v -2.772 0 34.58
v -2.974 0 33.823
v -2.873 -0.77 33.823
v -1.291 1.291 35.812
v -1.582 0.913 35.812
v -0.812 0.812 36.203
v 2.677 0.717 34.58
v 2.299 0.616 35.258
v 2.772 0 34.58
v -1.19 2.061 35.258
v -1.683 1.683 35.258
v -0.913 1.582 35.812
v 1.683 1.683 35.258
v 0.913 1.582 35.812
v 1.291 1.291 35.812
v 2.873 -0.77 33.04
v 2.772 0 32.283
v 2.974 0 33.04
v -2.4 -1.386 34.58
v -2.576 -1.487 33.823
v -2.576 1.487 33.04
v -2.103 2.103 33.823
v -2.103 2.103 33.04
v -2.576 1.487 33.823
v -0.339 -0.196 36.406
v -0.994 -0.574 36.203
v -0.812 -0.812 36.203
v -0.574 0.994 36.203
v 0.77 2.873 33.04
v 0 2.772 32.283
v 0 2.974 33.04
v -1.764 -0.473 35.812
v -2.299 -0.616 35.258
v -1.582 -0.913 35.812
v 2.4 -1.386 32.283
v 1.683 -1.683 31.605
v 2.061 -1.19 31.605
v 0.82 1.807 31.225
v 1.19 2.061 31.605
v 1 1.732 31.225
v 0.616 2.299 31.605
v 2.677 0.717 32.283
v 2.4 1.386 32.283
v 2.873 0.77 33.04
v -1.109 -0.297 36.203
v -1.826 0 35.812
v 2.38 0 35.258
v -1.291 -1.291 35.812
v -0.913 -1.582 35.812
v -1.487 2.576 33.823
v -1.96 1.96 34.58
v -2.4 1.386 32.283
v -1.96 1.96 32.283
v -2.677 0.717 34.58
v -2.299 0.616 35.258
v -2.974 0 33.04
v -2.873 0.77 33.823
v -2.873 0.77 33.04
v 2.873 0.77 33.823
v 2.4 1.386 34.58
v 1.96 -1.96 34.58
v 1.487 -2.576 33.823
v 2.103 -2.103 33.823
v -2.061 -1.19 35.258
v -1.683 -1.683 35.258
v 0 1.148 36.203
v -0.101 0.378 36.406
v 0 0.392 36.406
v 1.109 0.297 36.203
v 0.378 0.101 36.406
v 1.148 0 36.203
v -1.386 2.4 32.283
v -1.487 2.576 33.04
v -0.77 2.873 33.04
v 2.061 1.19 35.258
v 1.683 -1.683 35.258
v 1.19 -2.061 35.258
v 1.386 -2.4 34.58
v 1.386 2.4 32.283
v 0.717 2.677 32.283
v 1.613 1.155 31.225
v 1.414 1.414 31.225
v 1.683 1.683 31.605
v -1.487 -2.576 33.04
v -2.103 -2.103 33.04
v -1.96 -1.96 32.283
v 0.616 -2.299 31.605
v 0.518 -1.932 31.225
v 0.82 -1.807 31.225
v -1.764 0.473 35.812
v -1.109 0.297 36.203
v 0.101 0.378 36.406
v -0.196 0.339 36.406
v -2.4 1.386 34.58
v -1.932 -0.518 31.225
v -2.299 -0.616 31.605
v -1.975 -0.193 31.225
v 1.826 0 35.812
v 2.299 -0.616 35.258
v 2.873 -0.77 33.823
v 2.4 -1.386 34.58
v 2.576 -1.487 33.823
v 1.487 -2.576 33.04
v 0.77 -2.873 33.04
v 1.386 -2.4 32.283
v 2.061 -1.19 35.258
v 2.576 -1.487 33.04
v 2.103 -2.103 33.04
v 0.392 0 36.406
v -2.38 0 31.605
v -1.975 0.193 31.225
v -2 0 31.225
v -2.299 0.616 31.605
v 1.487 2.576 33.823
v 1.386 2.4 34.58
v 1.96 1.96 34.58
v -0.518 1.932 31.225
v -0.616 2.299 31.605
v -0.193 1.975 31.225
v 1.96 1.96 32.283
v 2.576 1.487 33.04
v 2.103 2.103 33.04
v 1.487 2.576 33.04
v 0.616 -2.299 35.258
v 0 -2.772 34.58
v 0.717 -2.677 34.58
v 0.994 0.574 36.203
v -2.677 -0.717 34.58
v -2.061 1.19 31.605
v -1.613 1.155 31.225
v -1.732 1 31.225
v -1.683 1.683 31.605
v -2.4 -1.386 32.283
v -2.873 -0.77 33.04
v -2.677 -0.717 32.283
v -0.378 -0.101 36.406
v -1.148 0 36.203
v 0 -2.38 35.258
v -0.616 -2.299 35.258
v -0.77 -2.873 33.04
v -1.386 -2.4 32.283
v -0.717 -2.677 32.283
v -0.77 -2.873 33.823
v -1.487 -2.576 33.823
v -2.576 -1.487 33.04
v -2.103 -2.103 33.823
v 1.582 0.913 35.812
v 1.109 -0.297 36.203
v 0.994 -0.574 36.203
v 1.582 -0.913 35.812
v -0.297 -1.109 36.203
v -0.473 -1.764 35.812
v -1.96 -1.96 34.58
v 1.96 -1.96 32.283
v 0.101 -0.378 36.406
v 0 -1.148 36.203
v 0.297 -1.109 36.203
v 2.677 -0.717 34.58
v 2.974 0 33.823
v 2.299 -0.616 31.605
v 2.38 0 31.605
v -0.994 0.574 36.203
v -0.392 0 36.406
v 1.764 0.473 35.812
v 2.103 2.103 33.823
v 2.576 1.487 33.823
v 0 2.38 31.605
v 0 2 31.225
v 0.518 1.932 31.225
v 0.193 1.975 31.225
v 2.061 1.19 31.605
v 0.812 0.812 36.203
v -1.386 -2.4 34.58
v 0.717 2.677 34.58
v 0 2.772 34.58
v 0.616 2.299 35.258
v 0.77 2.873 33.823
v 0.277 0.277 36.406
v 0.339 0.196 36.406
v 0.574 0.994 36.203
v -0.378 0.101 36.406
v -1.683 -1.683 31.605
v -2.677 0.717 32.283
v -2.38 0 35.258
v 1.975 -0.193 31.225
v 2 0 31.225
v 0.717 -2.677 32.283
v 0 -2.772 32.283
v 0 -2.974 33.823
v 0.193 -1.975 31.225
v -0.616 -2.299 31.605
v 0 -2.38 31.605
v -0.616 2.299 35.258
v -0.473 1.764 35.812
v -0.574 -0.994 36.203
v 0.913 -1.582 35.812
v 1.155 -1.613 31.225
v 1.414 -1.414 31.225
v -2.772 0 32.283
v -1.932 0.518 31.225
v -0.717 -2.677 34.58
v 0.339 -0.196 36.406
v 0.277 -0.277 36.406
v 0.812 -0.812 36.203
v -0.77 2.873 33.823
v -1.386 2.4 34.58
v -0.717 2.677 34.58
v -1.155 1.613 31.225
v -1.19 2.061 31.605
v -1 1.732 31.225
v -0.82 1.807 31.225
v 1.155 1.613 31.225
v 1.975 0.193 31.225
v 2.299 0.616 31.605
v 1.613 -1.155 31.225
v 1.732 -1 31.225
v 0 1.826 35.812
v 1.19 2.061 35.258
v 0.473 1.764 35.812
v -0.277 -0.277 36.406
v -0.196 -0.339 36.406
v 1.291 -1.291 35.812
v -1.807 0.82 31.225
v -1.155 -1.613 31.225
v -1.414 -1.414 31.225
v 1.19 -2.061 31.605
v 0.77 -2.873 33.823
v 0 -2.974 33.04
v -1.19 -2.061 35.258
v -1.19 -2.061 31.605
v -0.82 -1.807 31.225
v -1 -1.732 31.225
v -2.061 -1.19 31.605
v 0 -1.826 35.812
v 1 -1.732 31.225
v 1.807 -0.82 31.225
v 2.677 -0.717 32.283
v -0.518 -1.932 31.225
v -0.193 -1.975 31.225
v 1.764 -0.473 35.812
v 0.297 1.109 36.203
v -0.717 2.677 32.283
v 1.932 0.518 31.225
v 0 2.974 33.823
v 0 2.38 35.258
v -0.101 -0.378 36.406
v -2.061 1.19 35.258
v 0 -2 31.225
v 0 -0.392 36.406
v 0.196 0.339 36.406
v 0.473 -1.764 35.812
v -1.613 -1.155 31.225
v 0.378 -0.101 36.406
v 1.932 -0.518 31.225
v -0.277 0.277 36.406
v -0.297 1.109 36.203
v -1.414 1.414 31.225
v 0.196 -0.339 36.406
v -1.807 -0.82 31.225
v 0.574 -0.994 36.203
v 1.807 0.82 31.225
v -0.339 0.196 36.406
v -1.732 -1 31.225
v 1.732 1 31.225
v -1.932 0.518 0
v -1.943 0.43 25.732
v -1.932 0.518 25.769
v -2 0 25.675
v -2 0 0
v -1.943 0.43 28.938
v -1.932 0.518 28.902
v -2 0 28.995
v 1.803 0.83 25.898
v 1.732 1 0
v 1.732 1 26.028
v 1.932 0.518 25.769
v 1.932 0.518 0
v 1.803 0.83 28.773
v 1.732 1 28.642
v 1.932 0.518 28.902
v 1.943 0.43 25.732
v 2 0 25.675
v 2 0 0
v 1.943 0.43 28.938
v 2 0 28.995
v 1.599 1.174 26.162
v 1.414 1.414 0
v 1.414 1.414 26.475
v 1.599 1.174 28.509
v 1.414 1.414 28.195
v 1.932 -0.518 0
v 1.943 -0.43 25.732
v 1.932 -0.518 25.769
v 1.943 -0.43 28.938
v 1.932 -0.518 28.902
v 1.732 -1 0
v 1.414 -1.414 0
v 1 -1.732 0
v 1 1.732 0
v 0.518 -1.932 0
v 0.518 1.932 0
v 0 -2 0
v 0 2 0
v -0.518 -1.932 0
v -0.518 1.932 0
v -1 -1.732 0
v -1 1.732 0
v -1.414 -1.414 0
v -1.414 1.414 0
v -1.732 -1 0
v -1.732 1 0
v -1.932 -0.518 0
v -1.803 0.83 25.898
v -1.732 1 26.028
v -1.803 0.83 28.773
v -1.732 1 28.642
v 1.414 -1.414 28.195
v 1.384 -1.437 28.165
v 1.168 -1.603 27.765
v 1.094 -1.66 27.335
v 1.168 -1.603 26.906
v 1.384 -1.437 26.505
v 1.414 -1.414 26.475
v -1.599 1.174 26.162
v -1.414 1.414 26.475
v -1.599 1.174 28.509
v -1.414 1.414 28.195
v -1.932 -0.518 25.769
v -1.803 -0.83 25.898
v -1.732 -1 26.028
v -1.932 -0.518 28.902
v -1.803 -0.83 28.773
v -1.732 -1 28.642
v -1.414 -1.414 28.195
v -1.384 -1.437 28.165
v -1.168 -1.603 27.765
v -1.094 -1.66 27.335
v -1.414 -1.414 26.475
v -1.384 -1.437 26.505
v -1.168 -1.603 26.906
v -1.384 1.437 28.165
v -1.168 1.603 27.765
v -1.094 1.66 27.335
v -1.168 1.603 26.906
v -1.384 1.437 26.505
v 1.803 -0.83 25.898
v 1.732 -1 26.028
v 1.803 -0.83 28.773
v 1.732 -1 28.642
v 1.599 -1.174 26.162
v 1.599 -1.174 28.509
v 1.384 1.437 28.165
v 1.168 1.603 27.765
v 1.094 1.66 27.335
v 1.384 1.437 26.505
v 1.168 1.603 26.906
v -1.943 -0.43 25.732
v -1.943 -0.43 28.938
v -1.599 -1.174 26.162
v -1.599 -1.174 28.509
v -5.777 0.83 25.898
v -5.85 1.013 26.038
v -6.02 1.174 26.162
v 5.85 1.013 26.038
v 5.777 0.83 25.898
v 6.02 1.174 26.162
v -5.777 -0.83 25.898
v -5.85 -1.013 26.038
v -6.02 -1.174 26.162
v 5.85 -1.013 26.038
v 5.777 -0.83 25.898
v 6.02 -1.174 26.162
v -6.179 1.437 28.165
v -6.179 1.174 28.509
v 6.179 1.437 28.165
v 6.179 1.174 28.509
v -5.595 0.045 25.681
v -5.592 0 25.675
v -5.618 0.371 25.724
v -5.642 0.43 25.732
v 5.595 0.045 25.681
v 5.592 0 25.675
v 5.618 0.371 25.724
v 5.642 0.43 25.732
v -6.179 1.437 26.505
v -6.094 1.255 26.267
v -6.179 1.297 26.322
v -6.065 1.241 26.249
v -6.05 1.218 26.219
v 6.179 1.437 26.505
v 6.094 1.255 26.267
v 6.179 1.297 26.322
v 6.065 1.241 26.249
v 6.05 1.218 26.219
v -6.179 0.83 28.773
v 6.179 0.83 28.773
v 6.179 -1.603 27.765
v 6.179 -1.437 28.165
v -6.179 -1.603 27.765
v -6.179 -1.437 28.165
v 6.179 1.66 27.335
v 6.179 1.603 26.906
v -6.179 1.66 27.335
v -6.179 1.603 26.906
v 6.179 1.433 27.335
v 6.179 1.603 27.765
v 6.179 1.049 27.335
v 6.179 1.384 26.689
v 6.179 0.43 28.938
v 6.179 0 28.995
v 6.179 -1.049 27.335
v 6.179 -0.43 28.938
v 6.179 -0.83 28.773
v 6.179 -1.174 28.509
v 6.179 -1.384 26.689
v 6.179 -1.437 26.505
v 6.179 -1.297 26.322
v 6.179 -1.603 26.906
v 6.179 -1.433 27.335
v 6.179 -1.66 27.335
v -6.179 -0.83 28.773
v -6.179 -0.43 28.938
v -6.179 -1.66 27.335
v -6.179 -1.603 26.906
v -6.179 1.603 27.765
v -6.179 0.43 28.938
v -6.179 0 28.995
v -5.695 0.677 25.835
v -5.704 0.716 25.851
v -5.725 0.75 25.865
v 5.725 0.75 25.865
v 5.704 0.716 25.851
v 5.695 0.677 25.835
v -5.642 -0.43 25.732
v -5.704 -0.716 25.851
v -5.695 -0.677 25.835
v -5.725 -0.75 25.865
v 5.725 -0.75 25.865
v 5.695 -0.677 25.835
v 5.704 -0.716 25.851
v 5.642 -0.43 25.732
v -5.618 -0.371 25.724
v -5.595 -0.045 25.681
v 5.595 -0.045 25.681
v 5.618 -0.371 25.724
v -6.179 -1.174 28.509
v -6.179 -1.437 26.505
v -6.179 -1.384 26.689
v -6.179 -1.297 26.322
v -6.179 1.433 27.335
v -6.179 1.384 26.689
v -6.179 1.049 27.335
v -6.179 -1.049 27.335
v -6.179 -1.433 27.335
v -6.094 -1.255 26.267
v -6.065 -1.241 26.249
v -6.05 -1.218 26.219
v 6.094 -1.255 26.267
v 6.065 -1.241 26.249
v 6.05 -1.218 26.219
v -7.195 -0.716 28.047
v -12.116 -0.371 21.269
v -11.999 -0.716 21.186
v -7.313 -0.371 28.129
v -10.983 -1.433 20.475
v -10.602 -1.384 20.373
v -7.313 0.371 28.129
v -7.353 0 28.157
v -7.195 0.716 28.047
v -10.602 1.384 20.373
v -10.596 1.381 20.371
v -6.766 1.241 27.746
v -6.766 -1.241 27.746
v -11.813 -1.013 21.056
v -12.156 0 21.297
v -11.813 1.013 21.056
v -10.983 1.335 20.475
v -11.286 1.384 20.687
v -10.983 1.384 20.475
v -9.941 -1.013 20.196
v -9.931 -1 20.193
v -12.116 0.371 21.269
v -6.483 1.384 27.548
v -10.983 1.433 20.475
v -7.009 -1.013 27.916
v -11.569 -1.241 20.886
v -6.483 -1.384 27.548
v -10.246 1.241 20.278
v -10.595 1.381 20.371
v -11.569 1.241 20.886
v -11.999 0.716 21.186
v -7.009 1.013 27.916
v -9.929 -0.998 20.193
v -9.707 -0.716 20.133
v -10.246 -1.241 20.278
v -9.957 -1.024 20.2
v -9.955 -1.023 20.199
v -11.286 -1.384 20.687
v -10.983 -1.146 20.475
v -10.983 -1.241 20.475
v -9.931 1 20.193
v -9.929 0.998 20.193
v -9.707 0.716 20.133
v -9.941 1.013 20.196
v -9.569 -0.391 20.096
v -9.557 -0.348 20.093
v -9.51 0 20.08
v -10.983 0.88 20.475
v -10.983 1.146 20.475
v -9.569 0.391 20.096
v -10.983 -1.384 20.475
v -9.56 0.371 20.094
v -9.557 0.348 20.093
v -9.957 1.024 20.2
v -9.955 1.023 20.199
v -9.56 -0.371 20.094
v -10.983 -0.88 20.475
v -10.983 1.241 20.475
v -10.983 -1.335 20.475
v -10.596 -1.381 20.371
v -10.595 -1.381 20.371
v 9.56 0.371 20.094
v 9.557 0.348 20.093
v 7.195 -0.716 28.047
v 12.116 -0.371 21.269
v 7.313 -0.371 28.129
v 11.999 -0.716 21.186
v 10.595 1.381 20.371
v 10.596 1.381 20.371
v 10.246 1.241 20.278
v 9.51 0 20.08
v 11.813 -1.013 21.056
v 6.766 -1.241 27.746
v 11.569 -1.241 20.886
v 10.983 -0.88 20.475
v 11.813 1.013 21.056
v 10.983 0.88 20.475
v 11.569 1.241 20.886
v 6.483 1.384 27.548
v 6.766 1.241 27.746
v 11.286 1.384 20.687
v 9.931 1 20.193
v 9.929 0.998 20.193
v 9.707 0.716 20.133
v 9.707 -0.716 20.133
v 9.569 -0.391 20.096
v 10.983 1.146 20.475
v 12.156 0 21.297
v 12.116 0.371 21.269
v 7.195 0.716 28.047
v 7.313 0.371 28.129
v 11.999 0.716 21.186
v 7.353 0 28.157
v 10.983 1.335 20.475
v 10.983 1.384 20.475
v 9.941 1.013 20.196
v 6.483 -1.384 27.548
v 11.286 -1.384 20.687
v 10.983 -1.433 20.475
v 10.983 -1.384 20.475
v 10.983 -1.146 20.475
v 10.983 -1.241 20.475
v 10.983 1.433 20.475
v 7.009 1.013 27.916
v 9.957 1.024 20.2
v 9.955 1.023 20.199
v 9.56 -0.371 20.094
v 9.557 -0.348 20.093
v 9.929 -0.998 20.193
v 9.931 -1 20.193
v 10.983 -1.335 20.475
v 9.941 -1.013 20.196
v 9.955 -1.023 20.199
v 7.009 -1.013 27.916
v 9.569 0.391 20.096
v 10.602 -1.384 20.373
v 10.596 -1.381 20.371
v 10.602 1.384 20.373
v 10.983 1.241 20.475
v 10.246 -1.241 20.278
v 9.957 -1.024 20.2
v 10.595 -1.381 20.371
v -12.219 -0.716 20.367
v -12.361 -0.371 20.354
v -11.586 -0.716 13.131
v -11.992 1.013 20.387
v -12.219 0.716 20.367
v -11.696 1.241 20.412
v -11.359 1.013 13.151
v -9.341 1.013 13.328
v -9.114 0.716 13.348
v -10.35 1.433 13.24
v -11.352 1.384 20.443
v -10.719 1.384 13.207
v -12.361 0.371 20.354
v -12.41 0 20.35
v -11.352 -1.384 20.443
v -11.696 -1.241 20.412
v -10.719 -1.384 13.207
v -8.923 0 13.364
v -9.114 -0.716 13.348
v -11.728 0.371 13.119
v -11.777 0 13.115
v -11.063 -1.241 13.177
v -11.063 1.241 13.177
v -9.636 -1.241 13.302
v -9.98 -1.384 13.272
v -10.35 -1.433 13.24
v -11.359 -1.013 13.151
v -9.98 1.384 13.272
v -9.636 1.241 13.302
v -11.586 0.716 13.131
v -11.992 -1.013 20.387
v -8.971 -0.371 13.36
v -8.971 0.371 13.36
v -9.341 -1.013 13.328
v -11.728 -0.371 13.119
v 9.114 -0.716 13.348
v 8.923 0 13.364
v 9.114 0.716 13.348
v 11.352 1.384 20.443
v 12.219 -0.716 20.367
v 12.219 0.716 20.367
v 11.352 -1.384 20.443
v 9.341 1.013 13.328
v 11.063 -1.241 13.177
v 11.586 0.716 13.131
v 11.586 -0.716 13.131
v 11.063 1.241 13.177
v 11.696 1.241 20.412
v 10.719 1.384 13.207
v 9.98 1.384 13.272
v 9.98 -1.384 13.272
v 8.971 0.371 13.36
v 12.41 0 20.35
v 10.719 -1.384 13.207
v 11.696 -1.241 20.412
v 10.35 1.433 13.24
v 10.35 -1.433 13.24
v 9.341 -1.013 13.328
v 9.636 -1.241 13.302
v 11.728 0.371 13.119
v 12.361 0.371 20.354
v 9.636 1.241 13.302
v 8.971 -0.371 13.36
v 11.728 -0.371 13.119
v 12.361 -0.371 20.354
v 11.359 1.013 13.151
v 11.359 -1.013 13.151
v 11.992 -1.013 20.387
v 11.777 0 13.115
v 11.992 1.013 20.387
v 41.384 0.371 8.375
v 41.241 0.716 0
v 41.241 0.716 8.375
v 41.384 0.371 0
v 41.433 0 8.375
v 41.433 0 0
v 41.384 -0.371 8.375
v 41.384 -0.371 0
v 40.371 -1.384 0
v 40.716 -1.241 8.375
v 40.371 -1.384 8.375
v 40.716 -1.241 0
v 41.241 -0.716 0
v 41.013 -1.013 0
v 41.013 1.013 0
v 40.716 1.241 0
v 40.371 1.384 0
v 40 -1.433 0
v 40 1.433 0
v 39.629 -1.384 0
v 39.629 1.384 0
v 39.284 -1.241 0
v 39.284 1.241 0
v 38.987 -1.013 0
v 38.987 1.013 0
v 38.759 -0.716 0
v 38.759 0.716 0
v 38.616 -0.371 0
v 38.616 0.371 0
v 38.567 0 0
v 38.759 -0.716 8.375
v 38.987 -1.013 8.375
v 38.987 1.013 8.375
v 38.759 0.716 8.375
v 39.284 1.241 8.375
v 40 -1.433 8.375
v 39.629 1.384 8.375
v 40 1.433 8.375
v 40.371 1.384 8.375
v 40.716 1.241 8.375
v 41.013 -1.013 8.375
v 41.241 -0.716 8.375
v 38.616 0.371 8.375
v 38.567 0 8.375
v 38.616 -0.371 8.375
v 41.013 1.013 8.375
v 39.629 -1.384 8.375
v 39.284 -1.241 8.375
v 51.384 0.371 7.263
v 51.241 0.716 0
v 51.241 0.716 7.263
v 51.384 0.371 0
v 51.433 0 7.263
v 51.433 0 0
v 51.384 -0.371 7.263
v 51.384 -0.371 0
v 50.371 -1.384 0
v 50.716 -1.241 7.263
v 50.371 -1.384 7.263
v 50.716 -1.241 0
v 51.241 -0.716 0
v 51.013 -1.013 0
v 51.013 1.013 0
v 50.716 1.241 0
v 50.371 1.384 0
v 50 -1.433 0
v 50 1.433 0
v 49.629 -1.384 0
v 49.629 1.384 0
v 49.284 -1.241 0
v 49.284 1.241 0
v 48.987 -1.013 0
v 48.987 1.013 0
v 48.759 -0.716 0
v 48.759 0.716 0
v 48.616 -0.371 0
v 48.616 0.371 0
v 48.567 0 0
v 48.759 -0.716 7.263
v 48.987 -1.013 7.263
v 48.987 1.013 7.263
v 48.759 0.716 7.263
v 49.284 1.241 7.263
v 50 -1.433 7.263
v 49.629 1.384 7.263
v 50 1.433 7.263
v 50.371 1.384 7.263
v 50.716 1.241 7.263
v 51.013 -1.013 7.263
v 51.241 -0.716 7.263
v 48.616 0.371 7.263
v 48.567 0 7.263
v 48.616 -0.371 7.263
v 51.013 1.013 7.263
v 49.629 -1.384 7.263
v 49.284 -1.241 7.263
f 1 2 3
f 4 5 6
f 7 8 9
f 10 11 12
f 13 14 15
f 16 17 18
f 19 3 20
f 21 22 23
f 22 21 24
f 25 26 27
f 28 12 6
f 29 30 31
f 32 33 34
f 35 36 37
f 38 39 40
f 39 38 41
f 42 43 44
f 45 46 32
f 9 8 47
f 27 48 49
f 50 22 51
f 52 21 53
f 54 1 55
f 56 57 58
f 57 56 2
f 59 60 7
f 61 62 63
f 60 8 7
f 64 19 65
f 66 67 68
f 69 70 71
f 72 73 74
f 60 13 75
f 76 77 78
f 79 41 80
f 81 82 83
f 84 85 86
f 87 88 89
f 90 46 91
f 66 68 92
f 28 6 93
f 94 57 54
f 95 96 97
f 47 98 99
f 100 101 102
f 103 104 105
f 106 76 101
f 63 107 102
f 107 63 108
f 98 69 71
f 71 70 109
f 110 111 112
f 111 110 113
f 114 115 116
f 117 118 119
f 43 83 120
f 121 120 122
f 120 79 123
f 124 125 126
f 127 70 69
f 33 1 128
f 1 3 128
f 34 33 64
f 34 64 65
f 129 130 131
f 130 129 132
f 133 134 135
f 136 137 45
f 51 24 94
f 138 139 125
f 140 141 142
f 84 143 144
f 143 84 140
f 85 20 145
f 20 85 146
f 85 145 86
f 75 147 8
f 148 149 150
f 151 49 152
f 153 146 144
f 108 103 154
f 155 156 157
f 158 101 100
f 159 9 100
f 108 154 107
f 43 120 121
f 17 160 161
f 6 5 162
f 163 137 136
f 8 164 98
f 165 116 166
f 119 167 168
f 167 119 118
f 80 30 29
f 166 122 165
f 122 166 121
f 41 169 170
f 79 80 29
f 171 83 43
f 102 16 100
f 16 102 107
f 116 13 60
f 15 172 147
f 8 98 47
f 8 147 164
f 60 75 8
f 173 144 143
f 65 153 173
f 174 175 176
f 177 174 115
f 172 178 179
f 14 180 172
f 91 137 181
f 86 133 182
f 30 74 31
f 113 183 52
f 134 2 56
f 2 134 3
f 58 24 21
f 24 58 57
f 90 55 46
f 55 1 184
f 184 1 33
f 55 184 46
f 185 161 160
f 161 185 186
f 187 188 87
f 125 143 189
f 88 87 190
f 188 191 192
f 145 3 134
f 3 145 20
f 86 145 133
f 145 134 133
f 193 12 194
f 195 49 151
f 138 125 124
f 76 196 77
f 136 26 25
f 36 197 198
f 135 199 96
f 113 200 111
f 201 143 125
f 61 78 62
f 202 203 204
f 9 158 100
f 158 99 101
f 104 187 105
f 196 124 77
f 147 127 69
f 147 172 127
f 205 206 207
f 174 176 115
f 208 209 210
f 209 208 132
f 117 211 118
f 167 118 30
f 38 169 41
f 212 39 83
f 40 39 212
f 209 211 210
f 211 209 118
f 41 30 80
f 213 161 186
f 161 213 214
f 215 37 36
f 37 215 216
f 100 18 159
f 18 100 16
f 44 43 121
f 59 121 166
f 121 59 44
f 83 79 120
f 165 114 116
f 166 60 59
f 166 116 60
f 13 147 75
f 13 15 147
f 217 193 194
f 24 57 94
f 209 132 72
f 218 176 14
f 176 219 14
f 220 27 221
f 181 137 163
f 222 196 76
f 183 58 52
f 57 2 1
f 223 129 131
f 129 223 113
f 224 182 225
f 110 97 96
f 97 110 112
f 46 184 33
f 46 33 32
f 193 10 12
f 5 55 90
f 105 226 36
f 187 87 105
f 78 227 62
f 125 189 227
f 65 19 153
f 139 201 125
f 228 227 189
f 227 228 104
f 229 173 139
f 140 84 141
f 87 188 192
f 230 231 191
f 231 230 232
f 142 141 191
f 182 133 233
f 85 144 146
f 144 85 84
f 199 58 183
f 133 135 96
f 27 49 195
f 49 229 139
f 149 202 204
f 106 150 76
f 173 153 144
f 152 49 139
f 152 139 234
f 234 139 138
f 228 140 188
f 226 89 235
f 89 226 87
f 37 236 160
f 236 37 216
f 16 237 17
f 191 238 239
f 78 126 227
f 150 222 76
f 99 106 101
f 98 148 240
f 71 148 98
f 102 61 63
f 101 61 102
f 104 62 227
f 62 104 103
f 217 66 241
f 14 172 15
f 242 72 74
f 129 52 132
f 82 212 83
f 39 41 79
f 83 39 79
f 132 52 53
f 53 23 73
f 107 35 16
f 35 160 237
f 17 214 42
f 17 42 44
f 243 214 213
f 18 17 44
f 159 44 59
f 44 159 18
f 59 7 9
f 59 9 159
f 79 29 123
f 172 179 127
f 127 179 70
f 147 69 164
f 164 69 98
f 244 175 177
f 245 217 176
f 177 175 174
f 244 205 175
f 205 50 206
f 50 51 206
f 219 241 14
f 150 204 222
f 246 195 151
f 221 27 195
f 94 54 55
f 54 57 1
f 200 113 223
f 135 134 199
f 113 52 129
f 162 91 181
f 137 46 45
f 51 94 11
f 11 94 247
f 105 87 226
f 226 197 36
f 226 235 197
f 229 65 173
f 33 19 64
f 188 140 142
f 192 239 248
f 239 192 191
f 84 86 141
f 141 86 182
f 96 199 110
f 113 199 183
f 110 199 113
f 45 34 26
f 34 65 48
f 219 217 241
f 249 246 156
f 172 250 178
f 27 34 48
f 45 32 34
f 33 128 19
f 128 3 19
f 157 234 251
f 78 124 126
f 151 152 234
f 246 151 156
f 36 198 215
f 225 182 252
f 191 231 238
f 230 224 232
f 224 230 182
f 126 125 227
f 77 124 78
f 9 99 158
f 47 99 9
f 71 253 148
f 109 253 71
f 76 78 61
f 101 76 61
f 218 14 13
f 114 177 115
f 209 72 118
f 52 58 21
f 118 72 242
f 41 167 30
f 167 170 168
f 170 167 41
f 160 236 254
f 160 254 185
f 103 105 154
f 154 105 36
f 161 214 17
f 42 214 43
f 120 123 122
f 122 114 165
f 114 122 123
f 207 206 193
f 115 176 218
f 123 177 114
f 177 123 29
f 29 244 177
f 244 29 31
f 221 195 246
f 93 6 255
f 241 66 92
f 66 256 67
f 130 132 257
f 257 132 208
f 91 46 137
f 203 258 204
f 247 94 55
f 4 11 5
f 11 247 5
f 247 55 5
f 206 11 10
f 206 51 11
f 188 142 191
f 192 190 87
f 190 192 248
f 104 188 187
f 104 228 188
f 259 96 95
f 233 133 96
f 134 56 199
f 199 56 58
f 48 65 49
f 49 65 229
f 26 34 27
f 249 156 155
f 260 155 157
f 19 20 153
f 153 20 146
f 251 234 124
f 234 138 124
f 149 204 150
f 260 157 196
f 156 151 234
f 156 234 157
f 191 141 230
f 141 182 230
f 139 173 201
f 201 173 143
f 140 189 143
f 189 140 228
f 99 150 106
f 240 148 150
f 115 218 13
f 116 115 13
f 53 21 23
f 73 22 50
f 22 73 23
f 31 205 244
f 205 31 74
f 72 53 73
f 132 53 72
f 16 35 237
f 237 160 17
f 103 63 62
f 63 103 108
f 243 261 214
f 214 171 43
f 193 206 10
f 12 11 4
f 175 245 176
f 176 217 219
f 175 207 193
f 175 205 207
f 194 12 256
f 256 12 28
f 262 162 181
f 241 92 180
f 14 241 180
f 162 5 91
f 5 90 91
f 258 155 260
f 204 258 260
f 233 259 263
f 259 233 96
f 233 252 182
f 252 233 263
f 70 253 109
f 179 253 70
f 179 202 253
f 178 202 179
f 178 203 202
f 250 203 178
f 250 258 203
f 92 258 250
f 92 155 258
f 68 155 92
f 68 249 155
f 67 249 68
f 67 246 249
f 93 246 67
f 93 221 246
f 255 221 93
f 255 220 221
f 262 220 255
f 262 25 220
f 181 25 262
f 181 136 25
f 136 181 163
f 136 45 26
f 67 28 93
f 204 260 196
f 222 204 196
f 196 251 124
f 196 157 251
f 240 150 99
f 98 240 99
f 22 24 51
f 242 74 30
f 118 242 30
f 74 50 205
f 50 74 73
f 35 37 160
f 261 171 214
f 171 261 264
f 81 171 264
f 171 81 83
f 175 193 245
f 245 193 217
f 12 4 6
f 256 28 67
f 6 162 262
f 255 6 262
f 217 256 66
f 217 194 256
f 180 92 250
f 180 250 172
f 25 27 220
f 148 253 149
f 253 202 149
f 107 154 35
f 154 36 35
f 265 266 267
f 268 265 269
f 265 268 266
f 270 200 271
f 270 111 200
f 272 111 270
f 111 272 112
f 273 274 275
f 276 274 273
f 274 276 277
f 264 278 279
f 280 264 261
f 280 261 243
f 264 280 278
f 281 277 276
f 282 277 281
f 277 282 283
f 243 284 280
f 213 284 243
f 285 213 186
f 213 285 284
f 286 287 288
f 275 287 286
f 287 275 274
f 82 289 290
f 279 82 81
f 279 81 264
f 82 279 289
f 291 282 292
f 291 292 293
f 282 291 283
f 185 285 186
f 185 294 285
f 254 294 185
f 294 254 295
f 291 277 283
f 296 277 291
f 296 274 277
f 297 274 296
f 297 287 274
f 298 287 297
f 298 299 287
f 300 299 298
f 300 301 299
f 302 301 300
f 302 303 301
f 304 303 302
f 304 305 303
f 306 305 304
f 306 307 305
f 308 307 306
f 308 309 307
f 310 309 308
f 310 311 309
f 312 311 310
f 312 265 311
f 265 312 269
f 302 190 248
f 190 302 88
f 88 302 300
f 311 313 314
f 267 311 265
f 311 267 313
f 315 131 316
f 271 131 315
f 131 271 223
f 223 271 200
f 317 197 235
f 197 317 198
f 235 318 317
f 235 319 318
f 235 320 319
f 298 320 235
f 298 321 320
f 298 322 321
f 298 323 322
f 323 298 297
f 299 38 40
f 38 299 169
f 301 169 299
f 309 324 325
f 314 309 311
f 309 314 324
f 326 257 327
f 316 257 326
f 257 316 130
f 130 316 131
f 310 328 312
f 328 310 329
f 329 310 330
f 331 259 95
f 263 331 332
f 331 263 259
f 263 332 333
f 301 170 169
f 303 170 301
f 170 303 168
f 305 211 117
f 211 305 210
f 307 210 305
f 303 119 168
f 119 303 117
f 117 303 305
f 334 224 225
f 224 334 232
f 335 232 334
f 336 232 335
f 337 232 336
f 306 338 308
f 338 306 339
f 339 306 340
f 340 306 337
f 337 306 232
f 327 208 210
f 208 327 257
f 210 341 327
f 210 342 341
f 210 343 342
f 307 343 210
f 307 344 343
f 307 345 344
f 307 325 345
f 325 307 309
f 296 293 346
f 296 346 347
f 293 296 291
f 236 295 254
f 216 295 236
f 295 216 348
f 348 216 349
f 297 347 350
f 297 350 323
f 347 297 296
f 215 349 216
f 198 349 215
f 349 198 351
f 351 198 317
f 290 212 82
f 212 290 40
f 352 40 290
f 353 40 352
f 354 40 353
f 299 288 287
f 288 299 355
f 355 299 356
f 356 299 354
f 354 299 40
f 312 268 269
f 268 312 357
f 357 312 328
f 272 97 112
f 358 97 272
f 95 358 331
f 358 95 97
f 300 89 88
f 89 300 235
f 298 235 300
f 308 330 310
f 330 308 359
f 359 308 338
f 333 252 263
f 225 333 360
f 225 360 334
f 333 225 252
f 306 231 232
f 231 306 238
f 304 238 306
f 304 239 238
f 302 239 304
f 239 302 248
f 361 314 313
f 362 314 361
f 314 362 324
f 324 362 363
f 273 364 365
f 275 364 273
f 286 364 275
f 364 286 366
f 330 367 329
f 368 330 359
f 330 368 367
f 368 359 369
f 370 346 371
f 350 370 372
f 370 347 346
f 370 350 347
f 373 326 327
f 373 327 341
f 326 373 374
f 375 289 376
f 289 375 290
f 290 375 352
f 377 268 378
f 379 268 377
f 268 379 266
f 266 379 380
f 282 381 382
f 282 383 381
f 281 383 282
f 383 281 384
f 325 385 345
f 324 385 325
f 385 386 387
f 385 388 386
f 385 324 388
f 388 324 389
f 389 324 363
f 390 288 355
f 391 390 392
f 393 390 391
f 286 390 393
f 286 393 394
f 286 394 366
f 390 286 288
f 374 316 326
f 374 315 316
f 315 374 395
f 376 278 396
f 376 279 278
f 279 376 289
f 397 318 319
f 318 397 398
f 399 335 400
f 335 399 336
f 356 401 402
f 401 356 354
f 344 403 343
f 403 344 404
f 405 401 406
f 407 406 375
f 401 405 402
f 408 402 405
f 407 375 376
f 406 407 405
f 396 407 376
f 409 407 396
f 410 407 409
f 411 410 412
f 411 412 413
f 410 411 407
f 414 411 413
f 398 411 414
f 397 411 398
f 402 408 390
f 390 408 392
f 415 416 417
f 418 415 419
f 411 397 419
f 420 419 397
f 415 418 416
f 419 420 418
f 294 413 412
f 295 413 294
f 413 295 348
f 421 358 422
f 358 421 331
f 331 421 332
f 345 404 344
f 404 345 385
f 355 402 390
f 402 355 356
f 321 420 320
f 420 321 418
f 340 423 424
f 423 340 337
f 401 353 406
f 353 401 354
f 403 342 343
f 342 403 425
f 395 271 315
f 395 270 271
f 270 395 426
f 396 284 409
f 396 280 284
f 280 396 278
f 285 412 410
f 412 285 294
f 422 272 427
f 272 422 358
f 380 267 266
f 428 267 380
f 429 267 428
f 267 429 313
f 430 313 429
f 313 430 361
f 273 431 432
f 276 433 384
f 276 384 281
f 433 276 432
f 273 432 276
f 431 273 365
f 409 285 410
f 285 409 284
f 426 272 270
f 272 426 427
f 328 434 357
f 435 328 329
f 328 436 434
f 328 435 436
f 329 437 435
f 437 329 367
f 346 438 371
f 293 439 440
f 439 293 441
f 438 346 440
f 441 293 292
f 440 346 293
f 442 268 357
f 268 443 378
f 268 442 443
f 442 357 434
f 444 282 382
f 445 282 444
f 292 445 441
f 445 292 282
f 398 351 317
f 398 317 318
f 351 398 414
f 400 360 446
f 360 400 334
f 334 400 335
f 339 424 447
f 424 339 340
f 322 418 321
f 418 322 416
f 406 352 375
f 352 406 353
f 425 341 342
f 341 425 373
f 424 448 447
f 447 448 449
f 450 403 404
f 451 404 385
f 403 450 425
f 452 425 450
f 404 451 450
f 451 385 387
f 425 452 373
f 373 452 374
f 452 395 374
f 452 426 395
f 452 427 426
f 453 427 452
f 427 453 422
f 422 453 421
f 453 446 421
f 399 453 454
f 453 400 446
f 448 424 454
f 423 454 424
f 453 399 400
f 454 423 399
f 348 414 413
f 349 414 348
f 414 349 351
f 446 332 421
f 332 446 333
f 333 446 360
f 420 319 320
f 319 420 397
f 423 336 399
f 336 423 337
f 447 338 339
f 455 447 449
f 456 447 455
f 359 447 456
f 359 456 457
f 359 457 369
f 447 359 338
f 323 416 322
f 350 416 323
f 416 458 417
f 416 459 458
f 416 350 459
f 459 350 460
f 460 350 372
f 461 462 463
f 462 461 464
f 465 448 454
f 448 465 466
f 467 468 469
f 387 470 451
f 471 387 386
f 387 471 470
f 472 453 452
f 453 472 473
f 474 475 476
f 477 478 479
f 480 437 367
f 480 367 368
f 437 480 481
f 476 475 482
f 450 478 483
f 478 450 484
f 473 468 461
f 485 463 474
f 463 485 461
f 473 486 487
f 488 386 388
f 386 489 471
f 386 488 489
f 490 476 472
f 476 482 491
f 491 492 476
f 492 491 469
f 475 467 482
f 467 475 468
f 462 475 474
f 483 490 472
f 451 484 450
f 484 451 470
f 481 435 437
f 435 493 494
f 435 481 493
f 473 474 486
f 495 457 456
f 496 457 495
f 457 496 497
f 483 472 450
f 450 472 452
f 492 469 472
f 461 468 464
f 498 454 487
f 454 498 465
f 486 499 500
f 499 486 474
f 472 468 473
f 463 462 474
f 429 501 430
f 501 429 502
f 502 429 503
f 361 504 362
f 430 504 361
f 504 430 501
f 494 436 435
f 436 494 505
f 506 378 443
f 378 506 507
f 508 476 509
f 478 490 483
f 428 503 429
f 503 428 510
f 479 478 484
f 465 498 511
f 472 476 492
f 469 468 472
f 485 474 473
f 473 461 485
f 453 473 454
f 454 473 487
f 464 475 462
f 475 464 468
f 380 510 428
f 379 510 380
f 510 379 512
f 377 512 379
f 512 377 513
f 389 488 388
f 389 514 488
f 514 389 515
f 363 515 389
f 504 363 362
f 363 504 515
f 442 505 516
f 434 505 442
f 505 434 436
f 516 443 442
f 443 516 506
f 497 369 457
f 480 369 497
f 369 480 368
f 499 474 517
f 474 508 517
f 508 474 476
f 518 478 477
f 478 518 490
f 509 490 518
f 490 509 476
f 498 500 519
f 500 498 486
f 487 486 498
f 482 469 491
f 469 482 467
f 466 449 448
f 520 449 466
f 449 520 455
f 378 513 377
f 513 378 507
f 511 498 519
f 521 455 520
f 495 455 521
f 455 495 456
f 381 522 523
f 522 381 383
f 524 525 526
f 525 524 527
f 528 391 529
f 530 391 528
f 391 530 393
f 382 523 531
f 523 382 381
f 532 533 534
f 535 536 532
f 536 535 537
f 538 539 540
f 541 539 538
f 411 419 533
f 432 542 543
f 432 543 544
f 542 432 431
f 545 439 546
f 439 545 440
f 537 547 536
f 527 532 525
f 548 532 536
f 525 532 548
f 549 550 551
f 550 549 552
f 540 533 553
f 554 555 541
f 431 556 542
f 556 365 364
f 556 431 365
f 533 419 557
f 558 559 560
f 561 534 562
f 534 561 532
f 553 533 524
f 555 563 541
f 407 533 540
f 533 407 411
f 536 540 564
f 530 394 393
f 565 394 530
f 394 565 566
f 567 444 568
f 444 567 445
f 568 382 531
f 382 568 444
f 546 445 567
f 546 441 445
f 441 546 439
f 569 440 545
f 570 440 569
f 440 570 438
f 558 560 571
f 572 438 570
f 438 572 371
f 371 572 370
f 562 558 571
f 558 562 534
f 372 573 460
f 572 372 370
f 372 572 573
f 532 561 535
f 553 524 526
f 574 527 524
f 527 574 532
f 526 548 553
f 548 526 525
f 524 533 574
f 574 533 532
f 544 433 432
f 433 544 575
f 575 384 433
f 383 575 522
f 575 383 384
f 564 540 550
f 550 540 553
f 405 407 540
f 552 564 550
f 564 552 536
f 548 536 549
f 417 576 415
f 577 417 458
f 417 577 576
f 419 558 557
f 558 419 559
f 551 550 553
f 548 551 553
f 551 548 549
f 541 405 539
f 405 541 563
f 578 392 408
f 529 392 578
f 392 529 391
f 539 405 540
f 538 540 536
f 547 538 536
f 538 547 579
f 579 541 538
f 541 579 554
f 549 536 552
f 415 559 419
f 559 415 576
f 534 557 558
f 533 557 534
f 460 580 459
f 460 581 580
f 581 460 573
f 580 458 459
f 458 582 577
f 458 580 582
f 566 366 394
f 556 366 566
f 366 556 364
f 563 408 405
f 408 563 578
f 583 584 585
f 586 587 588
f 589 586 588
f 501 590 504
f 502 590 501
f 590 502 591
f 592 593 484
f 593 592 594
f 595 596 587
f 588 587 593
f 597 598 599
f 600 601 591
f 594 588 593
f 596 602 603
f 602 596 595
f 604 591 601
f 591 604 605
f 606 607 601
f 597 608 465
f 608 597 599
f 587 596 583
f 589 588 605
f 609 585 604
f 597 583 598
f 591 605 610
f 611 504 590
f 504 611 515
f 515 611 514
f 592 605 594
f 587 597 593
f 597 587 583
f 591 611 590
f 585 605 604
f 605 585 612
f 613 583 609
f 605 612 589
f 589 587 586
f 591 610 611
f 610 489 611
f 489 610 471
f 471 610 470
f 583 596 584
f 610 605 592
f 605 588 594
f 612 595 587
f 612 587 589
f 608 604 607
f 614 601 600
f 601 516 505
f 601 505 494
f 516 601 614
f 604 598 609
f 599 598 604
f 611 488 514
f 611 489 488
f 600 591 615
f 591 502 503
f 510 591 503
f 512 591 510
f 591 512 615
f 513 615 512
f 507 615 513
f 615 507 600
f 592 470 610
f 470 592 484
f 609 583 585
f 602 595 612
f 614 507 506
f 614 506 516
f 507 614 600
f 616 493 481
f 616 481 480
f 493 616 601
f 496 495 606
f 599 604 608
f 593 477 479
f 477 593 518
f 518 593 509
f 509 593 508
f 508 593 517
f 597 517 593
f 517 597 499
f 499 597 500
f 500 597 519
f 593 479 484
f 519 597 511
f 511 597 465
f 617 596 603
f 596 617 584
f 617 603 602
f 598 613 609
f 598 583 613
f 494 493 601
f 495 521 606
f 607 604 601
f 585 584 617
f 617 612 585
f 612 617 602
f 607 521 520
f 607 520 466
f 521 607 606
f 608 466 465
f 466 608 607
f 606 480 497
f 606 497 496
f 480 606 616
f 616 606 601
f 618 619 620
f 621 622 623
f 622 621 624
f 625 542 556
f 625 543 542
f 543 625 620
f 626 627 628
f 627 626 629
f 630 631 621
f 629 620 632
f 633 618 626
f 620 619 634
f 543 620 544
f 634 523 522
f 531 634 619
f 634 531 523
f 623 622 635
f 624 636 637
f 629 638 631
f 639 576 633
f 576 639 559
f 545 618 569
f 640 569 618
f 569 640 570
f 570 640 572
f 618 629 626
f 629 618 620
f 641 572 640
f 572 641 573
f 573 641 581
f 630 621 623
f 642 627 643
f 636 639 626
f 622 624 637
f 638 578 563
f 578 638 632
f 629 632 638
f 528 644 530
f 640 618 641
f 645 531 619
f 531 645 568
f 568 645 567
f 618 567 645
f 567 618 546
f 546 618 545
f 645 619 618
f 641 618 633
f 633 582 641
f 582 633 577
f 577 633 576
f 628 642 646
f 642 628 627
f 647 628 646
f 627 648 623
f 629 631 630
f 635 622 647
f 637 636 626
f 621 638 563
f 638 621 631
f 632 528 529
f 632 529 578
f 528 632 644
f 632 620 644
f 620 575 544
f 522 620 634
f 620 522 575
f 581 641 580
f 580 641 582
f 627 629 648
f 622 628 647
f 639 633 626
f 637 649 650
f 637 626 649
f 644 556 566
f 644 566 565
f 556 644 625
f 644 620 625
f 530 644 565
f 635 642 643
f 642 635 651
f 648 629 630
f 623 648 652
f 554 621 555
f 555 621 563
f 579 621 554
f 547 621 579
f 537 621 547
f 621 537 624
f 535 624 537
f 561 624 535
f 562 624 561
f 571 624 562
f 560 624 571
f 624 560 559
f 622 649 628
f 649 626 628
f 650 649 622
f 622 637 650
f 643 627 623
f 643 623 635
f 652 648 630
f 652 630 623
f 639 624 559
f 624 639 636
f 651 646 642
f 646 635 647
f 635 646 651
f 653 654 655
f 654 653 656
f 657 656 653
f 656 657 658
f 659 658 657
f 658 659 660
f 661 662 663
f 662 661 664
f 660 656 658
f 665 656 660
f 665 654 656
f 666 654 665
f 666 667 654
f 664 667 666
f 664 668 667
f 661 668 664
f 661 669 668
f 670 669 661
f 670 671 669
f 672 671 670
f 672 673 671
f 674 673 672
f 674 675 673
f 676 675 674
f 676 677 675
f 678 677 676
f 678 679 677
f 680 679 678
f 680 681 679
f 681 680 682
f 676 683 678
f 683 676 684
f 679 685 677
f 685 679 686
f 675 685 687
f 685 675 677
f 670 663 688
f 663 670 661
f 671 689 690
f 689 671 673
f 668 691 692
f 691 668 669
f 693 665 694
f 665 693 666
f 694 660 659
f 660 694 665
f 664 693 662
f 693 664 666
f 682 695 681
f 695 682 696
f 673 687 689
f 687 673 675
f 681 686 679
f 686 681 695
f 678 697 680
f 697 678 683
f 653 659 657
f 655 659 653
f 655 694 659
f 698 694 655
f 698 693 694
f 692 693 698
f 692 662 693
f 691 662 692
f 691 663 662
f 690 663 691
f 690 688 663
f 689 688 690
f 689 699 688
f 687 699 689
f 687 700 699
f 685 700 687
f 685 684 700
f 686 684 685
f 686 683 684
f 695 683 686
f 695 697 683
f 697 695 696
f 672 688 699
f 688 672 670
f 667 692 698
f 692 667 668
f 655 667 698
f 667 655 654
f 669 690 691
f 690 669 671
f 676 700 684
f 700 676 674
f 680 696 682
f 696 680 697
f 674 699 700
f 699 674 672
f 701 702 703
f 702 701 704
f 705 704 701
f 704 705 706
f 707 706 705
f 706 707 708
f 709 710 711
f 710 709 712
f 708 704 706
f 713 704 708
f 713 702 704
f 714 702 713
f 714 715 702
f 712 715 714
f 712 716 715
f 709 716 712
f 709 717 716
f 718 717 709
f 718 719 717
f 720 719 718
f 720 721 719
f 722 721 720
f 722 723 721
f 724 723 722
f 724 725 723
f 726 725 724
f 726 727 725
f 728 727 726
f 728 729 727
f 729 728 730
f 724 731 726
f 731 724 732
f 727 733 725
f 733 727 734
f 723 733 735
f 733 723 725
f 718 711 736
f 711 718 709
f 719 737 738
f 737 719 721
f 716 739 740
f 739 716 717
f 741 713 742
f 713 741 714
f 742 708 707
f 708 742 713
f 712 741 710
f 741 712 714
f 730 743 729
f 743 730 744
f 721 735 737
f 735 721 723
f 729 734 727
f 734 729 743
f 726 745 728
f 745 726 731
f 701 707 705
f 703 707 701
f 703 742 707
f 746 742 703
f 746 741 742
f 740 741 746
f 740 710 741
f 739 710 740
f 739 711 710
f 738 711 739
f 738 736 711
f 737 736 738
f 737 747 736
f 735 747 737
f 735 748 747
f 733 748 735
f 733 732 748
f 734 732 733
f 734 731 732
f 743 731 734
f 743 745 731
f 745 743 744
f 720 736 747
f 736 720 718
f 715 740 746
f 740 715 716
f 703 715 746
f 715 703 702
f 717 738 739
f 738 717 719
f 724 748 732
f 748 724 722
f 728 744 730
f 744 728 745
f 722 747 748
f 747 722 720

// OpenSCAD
height = rands(29.23, 40.51, 1)[0];
head = rands(4.44, 6.09, 1)[0];
shoulder = rands(10.81, 15, 1)[0];
shoulder_height = (height - rands(3.95, 7.25, 1)[0]);
shoulder_width = rands(1.25, 2.29, 1)[0];
upper_arm_length = rands(7.86, 10.81, 1)[0];
arm_width = rands(1.19, 2.085, 1)[0];
forearm_length_ratio = rands(0.757, 0.882, 1)[0];

upper_arm_angle = 145;
forearm_angle = 145;

// Calculate upper arm endpoints
left_arm_end_x  = -(shoulder / 2) + upper_arm_length * sin(-forearm_angle);
left_arm_end_z  = shoulder_height + upper_arm_length * cos(-forearm_angle);

right_arm_end_x = (shoulder / 2) + upper_arm_length * sin(forearm_angle);
right_arm_end_z = shoulder_height + upper_arm_length * cos(forearm_angle);

roundness = 24;

/////////////////////////////////////////////    
    
// Head
translate([0, 0, height]) {
    sphere(3, $fn = roundness);
}

// Body
cylinder(h = height, r = 2, $fn = roundness);

// Shoulders
translate([-(shoulder / 2), 0, shoulder_height]) {
    rotate([0, 90, 0]) {
        cylinder(h = shoulder, r = shoulder_width, $fn = roundness);
    }
}

// Upper arm left
translate([-(shoulder / 2), 0, shoulder_height]) {
    rotate([0, -upper_arm_angle, 0]) {
        cylinder(h = upper_arm_length, r = arm_width, $fn = roundness);
    }
}
// Upper arm right
translate([(shoulder / 2), 0, shoulder_height]) {
    rotate([0, 145, 0]) {
        cylinder(h = upper_arm_length, r = arm_width, $fn = roundness);
    }
}

// Forearm left
translate([left_arm_end_x, 0, left_arm_end_z]) {
    rotate([0, -185, 0]) {
        cylinder(h = (upper_arm_length * forearm_length_ratio), r = arm_width, $fn = roundness);
    }
}

// Forearm right
translate([right_arm_end_x, 0, right_arm_end_z]) {
    rotate([0, 185, 0]) {
        cylinder(h = (upper_arm_length * forearm_length_ratio), r = arm_width, $fn = roundness);
    }
}


translate([40, 0, 0]) {
    cylinder(h = upper_arm_length, r = arm_width, $fn = roundness);
}
translate([50, 0, 0]) {
    cylinder(h = (upper_arm_length * forearm_length_ratio), r = arm_width, $fn = roundness);
}
